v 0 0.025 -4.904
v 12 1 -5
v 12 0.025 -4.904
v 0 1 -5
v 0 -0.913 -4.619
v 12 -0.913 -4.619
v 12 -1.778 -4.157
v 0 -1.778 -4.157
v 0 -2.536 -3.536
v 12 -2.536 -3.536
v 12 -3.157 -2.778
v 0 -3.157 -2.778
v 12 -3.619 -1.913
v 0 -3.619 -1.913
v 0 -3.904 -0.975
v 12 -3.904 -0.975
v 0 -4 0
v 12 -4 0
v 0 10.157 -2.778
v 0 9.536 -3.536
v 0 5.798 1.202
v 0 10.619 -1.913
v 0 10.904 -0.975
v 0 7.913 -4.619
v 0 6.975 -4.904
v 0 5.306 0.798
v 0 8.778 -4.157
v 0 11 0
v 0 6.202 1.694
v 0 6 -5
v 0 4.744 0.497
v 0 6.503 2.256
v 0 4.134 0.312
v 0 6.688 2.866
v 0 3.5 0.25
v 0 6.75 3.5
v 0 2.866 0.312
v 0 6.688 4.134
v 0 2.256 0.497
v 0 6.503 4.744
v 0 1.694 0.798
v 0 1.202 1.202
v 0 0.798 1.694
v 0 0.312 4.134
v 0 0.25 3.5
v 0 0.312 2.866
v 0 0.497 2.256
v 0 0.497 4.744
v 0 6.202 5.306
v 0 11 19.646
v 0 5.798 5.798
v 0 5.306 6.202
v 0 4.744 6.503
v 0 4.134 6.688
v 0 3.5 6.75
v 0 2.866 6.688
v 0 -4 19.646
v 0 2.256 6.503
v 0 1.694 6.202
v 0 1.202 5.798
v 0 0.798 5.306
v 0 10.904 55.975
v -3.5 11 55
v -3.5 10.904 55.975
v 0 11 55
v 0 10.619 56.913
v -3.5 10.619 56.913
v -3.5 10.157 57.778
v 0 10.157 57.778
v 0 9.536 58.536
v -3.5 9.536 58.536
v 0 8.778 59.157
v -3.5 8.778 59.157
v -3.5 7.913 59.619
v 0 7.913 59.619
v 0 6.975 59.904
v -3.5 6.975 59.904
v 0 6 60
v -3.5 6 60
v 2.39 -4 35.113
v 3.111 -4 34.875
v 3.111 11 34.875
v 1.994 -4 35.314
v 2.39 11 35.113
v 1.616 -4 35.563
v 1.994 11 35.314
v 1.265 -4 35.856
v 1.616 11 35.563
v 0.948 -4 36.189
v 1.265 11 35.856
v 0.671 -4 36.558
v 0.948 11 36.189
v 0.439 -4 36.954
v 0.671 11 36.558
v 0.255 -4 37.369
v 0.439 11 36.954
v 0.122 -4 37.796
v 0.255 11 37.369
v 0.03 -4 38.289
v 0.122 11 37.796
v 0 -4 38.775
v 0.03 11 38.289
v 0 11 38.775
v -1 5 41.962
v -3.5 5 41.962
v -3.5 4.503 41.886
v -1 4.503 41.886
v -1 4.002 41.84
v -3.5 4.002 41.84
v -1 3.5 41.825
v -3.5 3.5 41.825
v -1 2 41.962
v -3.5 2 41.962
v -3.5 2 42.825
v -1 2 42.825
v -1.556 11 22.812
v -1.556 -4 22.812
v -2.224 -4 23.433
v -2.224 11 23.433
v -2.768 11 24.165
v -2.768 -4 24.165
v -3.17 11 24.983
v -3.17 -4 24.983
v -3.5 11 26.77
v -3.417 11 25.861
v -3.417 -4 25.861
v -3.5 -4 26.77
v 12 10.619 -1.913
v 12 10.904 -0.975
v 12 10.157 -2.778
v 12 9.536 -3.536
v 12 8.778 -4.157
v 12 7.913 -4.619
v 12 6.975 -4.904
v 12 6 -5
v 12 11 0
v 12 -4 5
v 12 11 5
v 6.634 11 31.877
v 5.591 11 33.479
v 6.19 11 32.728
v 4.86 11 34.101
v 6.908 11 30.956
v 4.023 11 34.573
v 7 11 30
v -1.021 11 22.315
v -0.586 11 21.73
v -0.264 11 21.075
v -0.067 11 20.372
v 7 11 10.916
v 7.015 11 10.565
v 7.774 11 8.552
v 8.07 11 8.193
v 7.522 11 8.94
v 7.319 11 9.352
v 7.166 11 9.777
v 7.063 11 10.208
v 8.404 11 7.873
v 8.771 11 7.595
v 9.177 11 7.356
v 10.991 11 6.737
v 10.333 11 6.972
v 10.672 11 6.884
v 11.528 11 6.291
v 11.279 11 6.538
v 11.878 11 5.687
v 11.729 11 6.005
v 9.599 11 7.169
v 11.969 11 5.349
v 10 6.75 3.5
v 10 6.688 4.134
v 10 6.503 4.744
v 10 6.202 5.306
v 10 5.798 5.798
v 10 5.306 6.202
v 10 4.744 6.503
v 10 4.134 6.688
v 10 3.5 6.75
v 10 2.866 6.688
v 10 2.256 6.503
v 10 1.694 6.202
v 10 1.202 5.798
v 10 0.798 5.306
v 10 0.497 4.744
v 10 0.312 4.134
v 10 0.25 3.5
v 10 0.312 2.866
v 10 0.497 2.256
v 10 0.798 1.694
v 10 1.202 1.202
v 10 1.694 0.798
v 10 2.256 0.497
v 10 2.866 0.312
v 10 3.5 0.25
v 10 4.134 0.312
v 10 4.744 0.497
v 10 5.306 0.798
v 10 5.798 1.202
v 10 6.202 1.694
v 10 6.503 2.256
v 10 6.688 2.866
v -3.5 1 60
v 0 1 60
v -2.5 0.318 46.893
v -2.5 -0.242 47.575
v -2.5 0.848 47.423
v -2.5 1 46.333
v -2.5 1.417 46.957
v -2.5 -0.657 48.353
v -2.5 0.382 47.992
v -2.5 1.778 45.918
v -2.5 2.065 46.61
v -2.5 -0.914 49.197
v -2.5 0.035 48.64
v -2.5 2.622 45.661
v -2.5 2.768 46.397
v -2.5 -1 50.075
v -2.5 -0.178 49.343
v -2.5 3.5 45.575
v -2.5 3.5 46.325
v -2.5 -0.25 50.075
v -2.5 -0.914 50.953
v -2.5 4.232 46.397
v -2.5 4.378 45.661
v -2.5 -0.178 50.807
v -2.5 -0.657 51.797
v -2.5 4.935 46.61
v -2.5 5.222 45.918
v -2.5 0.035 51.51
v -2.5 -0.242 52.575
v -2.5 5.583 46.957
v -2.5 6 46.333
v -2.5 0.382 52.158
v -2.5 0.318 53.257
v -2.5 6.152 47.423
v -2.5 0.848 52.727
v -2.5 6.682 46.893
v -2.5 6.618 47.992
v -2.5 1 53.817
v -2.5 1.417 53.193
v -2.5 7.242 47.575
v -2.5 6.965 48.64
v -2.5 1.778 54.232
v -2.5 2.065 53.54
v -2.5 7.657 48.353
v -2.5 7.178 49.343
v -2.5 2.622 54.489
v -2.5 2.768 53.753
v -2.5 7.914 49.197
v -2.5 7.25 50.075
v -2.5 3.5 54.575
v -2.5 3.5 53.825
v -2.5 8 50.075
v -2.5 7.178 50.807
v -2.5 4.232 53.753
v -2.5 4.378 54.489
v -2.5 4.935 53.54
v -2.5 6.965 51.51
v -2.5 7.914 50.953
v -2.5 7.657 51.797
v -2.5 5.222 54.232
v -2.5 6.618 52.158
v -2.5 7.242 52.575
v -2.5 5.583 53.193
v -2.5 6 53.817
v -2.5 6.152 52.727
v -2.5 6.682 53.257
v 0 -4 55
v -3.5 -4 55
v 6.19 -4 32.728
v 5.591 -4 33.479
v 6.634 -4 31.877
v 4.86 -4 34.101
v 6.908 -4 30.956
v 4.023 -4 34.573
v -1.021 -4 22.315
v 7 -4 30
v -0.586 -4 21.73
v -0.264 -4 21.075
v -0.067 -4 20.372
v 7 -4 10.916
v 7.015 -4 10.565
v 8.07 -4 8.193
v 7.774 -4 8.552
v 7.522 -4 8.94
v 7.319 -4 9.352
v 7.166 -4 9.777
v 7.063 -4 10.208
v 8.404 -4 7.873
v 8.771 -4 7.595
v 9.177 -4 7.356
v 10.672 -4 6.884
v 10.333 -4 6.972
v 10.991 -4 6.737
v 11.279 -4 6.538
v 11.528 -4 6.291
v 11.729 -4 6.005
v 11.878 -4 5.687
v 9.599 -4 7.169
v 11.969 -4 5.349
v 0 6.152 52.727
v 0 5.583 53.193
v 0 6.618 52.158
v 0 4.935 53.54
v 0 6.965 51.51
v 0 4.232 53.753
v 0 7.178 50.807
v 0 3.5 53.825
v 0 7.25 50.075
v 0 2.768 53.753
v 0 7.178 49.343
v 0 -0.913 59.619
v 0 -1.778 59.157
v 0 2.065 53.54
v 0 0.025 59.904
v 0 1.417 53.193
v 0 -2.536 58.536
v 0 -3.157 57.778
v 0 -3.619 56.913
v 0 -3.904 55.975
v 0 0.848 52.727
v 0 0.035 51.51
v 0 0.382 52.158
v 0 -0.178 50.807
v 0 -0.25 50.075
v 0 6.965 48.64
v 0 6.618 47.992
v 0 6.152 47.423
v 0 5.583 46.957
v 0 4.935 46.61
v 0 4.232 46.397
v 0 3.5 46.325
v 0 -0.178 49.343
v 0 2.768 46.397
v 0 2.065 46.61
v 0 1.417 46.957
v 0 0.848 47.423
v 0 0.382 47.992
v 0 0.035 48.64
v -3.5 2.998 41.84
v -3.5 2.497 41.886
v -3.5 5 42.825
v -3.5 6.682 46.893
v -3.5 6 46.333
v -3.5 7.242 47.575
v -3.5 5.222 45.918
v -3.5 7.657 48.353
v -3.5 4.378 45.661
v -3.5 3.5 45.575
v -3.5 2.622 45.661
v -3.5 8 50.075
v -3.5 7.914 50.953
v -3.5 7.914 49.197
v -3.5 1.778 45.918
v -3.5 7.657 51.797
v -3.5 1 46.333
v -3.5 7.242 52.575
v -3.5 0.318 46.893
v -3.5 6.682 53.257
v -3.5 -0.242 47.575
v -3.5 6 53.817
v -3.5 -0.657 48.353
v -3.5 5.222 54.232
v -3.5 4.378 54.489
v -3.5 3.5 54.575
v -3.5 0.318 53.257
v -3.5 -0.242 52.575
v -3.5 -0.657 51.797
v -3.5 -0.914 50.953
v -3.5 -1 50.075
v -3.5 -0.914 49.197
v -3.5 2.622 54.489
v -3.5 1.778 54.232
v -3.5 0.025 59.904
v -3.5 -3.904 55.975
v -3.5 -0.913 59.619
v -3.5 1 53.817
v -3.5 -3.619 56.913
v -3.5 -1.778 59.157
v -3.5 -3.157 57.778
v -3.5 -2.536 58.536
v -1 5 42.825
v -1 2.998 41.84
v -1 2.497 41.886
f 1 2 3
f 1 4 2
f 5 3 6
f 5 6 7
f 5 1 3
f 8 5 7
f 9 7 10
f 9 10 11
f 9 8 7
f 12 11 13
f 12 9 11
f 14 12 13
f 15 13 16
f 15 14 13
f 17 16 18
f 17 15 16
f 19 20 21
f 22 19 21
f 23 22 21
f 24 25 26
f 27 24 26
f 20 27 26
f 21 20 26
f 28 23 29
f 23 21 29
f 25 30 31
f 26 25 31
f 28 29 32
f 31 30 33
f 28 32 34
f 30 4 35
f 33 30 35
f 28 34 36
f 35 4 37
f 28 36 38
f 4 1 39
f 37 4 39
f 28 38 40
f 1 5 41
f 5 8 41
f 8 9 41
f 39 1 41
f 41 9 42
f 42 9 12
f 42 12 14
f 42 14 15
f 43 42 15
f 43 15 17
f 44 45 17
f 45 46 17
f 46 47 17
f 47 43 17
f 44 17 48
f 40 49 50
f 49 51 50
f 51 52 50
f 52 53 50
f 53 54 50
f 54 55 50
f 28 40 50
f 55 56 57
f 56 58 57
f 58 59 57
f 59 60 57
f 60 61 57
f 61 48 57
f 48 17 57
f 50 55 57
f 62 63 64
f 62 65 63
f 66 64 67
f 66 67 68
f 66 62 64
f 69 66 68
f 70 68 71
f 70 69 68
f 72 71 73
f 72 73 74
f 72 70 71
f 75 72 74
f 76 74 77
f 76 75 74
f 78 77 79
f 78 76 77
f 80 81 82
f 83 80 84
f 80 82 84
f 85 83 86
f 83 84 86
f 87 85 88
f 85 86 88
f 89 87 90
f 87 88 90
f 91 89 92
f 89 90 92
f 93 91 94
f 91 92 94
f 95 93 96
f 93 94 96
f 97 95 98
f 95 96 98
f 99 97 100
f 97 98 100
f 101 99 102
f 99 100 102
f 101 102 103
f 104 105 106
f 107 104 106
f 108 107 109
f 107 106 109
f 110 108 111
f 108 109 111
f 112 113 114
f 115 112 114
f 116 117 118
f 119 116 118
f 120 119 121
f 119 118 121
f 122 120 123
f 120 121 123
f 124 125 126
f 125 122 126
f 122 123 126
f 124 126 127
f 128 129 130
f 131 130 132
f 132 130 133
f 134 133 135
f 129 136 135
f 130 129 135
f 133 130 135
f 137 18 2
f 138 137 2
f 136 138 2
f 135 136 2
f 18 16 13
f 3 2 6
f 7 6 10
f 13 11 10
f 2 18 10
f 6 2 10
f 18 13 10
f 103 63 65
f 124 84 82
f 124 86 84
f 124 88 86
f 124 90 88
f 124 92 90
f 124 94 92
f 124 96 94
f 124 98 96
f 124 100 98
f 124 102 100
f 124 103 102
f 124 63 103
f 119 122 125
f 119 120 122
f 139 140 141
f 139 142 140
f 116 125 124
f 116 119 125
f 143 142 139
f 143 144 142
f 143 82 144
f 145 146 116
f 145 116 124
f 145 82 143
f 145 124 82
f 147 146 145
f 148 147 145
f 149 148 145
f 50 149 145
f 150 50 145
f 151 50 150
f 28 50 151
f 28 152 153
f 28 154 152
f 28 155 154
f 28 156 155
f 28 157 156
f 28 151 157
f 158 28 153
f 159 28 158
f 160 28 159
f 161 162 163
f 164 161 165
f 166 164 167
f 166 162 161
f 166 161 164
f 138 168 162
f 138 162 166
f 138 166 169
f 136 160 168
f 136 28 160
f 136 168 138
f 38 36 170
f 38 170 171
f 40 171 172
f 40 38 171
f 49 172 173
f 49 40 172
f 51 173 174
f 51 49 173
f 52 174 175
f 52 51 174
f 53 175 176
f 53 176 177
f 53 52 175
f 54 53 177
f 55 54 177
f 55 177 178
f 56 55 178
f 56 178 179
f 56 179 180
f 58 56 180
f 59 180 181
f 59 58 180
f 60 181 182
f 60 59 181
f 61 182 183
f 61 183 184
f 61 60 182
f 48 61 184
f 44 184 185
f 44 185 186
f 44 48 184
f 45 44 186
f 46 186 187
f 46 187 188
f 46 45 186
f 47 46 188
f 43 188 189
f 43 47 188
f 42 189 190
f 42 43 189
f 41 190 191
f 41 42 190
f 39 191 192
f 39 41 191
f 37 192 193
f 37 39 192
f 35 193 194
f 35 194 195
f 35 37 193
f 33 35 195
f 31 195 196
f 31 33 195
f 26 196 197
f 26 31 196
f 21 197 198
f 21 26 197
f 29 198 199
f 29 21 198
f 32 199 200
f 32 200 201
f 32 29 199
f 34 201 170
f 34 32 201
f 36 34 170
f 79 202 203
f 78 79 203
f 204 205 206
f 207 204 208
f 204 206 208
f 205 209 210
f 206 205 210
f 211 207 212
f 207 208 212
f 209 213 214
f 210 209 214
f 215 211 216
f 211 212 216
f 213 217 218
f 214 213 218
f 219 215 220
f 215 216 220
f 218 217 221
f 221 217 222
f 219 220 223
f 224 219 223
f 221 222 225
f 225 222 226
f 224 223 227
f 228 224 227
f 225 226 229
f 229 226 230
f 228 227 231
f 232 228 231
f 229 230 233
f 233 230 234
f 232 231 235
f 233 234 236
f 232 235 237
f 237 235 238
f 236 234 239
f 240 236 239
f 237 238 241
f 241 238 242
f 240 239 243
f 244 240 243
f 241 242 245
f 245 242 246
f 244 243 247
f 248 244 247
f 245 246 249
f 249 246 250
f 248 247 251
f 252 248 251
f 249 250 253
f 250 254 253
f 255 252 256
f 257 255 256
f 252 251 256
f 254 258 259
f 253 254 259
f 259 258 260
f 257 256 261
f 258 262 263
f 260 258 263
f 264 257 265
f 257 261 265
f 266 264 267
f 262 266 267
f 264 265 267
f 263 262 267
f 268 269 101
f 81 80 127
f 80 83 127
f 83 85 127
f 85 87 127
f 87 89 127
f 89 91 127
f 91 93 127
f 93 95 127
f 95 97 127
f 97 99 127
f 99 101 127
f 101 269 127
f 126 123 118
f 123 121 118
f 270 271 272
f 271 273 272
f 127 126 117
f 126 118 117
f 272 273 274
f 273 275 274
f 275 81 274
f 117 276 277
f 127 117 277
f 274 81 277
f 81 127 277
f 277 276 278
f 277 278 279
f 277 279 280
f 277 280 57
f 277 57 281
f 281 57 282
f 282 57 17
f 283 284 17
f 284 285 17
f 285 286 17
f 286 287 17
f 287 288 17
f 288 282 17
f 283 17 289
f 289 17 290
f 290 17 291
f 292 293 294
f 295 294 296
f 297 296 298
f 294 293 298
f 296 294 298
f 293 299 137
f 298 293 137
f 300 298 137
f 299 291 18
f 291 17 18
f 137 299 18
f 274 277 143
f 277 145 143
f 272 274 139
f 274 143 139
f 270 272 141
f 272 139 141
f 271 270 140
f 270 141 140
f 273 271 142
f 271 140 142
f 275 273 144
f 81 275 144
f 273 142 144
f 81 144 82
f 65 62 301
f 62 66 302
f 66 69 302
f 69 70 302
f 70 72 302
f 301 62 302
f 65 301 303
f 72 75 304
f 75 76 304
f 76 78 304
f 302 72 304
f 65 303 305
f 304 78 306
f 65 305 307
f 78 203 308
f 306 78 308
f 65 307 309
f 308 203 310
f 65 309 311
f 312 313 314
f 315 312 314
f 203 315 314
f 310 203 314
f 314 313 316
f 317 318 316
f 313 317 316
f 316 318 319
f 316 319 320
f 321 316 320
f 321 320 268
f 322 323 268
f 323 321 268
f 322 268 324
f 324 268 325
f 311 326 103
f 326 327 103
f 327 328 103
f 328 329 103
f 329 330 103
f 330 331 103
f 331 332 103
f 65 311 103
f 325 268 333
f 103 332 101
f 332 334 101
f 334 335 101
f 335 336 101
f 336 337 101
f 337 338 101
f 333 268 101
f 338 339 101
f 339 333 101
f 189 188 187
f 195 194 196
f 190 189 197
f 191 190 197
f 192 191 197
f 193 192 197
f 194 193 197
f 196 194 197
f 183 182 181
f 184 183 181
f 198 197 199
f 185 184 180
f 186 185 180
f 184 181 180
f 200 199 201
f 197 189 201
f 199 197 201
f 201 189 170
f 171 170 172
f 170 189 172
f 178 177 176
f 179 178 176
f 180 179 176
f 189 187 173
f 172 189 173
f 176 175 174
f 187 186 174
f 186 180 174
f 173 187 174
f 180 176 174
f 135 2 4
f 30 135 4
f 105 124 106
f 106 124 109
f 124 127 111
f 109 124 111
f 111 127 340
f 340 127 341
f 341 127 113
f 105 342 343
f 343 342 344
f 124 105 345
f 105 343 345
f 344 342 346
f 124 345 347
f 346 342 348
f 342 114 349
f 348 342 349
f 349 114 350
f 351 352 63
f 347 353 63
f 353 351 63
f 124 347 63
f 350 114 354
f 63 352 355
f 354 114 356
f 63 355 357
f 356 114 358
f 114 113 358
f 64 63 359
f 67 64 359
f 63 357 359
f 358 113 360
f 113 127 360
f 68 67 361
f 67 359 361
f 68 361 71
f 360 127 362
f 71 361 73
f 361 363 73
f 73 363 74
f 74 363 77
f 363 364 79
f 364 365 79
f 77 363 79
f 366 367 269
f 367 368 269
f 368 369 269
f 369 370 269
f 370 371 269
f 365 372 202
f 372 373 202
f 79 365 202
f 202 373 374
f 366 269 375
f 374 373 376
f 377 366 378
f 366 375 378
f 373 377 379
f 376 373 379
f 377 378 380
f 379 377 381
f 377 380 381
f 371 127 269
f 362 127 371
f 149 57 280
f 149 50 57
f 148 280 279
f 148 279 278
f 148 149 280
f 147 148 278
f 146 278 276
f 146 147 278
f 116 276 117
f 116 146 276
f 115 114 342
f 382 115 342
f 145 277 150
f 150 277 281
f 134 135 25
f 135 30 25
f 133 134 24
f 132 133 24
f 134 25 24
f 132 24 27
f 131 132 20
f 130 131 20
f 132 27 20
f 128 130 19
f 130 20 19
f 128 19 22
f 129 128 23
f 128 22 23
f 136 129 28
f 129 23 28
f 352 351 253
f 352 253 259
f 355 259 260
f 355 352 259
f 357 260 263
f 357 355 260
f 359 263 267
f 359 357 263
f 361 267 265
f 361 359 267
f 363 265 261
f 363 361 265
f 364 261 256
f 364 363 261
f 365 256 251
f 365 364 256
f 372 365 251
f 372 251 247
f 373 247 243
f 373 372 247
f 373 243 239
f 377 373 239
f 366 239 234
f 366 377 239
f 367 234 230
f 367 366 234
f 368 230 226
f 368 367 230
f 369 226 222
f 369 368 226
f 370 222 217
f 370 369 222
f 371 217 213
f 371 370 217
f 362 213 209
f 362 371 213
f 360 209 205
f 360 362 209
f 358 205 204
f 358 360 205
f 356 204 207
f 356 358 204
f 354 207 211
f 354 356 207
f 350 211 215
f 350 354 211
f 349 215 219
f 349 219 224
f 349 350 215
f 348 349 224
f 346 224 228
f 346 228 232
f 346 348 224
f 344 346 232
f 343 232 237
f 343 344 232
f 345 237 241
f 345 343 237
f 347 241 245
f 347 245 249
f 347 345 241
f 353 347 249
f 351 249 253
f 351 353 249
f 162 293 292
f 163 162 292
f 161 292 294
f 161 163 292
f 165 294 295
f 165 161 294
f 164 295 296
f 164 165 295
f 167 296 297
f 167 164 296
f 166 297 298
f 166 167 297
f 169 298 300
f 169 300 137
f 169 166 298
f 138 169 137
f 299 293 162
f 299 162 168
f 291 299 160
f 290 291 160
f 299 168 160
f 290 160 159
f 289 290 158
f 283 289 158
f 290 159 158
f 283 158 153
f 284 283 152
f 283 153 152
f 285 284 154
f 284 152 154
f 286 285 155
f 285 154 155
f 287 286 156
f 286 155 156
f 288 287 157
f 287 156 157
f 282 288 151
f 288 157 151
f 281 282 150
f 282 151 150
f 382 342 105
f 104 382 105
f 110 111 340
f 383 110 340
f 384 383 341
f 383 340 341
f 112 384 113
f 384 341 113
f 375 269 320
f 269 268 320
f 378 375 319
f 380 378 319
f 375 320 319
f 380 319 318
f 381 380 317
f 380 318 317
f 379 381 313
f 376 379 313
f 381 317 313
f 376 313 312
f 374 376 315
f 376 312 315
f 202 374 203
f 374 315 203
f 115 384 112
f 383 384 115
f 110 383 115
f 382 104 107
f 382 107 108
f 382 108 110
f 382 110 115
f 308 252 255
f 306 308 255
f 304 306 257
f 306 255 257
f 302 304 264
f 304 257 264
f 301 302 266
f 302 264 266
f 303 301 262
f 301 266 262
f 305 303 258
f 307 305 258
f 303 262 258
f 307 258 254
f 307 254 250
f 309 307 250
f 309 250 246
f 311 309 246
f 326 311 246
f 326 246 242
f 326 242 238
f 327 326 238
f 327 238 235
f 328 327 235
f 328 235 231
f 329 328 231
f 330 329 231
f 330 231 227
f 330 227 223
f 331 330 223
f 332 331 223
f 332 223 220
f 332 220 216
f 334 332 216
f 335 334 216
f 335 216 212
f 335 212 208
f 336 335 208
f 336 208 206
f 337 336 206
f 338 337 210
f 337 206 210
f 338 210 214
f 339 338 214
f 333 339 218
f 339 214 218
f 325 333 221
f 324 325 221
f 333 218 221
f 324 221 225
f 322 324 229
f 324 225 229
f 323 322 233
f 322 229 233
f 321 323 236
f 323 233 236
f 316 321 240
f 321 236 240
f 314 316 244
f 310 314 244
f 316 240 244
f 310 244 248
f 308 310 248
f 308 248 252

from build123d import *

# Parameters (mm, degrees)
BOSS_EXTRUDE1_DEPTH      = 11
BOSS_EXTRUDE1_DEPTH_BACK = 4
CUT_EXTRUDE1_OUTLINE_R   = 3.25
CUT_EXTRUDE1_DEPTH       = 10
CUT_EXTRUDE3_START       = -3.5
CUT_EXTRUDE3_OUTLINE_R   = 4.5
CUT_EXTRUDE3_DEPTH       = 1
CUT_EXTRUDE4_REACH       = 64.7
SKETCH5_R                = 3.75
CUT_EXTRUDE5_DEPTH       = 2.5
FILLET1_R                = 5
FILLET2_R                = 5
FILLET3_R                = 5
FILLET4_R                = 2
FILLET5_R                = 4
FILLET6_R                = 4


# Read off the part's stored shape, not the designer's step: Cut-Extrude1, Cut-Extrude3
with BuildPart() as part:
    # Sketch2 → Boss-Extrude1 (new, two sides: drawn at the far end of the back side and taken through both)
    with BuildSketch(Plane(origin=(0, 0, 0), x_dir=(1, 0, 0), z_dir=(0, 1, 0)).offset(-BOSS_EXTRUDE1_DEPTH_BACK)):
        Polygon((0, 5), (0, -22), (-3.5, -22), (-3.5, -60), (0, -60), (0, -35), (7, -35), (7, -7), (12, -7), (12, 5), align=None)
    extrude(amount=BOSS_EXTRUDE1_DEPTH + BOSS_EXTRUDE1_DEPTH_BACK)

    # Cut-Extrude1 outline → Cut-Extrude1 (cut)
    with BuildSketch(Plane.YZ):
        with Locations((3.5, 3.5)):
            Circle(CUT_EXTRUDE1_OUTLINE_R)
    extrude(amount=CUT_EXTRUDE1_DEPTH, mode=Mode.SUBTRACT)

    # Cut-Extrude3 outline → Cut-Extrude3 (cut)
    with BuildSketch(Plane.YZ.offset(CUT_EXTRUDE3_START)):
        with Locations((3.5, 50.074977824)):
            Circle(CUT_EXTRUDE3_OUTLINE_R)
    extrude(amount=CUT_EXTRUDE3_DEPTH, mode=Mode.SUBTRACT)

    # Sketch5 → Cut-Extrude4 (cut, up to next)
    with BuildSketch(Plane.ZY.offset(2.5), mode=Mode.PRIVATE) as cut_extrude4_sk1:
        with Locations((50.074977824, 3.5)):
            Circle(SKETCH5_R)
    cut_extrude4_tool1 = extrude(cut_extrude4_sk1.sketch, amount=-CUT_EXTRUDE4_REACH, mode=Mode.PRIVATE) & part.part
    add(cut_extrude4_tool1.solids().sort_by_distance((-2.5, 3.5, 50.074978))[0], mode=Mode.SUBTRACT)

    # Sketch10 → Cut-Extrude5 (cut)
    with BuildSketch(Plane.ZY.offset(3.5)):
        with BuildLine():
            ThreePointArc((41.962487455, 5), (41.859427156, 4.25314489), (41.824977824, 3.5))
            Line((41.824977824, 3.5), (42.824977824, 3.5))
            Line((42.824977824, 3.5), (42.824977824, 5))
            Line((42.824977824, 5), (41.962487455, 5))
        make_face()
        with BuildLine():
            Line((42.824977824, 3.5), (41.824977824, 3.5))
            ThreePointArc((41.824977824, 3.5), (41.859427156, 2.74685511), (41.962487455, 2))
            Line((41.962487455, 2), (42.824977824, 2))
            Line((42.824977824, 2), (42.824977824, 3.5))
        make_face()
    extrude(amount=-CUT_EXTRUDE5_DEPTH, mode=Mode.SUBTRACT)

    # Fillet1
    fillet1_edges = [part.edges().sort_by_distance(p)[0] for p in [
        (6, -4, -5),
        (6, 11, -5),
        (-1.75, -4, 60),
        (-1.75, 11, 60),
    ]]
    fillet(fillet1_edges, radius=FILLET1_R)

    # Fillet2
    # the kernel refuses this fillet: 5 mm, written as the material it takes off along each edge
    with BuildSketch(Plane(origin=(-3.5, -15.924240018, 22), x_dir=(1, 0, 0), z_dir=(0, 1, 0))) as fillet2_piece_1:
        with BuildLine():
            CenterArc((5, -4.769696007), FILLET2_R, 107.457603124, 72.542396876)
            Line((0, -4.769696007), (-0.1, -4.769696007))
            Line((-0.1, -4.769696007), (-0.1, 0))
            Line((-0.1, 0), (0, 0.1))
            ThreePointArc((0, 0.1), (1.75, 0.1), (3.47, 0.09539392))
            Line((3.47, 0.09539392), (3.5, 0))
        make_face()
    extrude(amount=38.848480035, mode=Mode.SUBTRACT)

    # Fillet3
    fillet3_edges = [part.edges().sort_by_distance(p)[0] for p in [
        (7, 3.5, 35),
    ]]
    fillet(fillet3_edges, radius=FILLET3_R)

    # Fillet4
    fillet4_edges = [part.edges().sort_by_distance(p)[0] for p in [
        (12, 3.5, 7),
    ]]
    fillet(fillet4_edges, radius=FILLET4_R)

    # Fillet5
    fillet5_edges = [part.edges().sort_by_distance(p)[0] for p in [
        (7, 3.5, 7),
        (0, 3.5, 35),
    ]]
    fillet(fillet5_edges, radius=FILLET5_R)

    # Fillet6
    fillet6_edges = [part.edges().sort_by_distance(p)[0] for p in [
        (0, 3.5, 22),
    ]]
    fillet(fillet6_edges, radius=FILLET6_R)


solid = part.part
